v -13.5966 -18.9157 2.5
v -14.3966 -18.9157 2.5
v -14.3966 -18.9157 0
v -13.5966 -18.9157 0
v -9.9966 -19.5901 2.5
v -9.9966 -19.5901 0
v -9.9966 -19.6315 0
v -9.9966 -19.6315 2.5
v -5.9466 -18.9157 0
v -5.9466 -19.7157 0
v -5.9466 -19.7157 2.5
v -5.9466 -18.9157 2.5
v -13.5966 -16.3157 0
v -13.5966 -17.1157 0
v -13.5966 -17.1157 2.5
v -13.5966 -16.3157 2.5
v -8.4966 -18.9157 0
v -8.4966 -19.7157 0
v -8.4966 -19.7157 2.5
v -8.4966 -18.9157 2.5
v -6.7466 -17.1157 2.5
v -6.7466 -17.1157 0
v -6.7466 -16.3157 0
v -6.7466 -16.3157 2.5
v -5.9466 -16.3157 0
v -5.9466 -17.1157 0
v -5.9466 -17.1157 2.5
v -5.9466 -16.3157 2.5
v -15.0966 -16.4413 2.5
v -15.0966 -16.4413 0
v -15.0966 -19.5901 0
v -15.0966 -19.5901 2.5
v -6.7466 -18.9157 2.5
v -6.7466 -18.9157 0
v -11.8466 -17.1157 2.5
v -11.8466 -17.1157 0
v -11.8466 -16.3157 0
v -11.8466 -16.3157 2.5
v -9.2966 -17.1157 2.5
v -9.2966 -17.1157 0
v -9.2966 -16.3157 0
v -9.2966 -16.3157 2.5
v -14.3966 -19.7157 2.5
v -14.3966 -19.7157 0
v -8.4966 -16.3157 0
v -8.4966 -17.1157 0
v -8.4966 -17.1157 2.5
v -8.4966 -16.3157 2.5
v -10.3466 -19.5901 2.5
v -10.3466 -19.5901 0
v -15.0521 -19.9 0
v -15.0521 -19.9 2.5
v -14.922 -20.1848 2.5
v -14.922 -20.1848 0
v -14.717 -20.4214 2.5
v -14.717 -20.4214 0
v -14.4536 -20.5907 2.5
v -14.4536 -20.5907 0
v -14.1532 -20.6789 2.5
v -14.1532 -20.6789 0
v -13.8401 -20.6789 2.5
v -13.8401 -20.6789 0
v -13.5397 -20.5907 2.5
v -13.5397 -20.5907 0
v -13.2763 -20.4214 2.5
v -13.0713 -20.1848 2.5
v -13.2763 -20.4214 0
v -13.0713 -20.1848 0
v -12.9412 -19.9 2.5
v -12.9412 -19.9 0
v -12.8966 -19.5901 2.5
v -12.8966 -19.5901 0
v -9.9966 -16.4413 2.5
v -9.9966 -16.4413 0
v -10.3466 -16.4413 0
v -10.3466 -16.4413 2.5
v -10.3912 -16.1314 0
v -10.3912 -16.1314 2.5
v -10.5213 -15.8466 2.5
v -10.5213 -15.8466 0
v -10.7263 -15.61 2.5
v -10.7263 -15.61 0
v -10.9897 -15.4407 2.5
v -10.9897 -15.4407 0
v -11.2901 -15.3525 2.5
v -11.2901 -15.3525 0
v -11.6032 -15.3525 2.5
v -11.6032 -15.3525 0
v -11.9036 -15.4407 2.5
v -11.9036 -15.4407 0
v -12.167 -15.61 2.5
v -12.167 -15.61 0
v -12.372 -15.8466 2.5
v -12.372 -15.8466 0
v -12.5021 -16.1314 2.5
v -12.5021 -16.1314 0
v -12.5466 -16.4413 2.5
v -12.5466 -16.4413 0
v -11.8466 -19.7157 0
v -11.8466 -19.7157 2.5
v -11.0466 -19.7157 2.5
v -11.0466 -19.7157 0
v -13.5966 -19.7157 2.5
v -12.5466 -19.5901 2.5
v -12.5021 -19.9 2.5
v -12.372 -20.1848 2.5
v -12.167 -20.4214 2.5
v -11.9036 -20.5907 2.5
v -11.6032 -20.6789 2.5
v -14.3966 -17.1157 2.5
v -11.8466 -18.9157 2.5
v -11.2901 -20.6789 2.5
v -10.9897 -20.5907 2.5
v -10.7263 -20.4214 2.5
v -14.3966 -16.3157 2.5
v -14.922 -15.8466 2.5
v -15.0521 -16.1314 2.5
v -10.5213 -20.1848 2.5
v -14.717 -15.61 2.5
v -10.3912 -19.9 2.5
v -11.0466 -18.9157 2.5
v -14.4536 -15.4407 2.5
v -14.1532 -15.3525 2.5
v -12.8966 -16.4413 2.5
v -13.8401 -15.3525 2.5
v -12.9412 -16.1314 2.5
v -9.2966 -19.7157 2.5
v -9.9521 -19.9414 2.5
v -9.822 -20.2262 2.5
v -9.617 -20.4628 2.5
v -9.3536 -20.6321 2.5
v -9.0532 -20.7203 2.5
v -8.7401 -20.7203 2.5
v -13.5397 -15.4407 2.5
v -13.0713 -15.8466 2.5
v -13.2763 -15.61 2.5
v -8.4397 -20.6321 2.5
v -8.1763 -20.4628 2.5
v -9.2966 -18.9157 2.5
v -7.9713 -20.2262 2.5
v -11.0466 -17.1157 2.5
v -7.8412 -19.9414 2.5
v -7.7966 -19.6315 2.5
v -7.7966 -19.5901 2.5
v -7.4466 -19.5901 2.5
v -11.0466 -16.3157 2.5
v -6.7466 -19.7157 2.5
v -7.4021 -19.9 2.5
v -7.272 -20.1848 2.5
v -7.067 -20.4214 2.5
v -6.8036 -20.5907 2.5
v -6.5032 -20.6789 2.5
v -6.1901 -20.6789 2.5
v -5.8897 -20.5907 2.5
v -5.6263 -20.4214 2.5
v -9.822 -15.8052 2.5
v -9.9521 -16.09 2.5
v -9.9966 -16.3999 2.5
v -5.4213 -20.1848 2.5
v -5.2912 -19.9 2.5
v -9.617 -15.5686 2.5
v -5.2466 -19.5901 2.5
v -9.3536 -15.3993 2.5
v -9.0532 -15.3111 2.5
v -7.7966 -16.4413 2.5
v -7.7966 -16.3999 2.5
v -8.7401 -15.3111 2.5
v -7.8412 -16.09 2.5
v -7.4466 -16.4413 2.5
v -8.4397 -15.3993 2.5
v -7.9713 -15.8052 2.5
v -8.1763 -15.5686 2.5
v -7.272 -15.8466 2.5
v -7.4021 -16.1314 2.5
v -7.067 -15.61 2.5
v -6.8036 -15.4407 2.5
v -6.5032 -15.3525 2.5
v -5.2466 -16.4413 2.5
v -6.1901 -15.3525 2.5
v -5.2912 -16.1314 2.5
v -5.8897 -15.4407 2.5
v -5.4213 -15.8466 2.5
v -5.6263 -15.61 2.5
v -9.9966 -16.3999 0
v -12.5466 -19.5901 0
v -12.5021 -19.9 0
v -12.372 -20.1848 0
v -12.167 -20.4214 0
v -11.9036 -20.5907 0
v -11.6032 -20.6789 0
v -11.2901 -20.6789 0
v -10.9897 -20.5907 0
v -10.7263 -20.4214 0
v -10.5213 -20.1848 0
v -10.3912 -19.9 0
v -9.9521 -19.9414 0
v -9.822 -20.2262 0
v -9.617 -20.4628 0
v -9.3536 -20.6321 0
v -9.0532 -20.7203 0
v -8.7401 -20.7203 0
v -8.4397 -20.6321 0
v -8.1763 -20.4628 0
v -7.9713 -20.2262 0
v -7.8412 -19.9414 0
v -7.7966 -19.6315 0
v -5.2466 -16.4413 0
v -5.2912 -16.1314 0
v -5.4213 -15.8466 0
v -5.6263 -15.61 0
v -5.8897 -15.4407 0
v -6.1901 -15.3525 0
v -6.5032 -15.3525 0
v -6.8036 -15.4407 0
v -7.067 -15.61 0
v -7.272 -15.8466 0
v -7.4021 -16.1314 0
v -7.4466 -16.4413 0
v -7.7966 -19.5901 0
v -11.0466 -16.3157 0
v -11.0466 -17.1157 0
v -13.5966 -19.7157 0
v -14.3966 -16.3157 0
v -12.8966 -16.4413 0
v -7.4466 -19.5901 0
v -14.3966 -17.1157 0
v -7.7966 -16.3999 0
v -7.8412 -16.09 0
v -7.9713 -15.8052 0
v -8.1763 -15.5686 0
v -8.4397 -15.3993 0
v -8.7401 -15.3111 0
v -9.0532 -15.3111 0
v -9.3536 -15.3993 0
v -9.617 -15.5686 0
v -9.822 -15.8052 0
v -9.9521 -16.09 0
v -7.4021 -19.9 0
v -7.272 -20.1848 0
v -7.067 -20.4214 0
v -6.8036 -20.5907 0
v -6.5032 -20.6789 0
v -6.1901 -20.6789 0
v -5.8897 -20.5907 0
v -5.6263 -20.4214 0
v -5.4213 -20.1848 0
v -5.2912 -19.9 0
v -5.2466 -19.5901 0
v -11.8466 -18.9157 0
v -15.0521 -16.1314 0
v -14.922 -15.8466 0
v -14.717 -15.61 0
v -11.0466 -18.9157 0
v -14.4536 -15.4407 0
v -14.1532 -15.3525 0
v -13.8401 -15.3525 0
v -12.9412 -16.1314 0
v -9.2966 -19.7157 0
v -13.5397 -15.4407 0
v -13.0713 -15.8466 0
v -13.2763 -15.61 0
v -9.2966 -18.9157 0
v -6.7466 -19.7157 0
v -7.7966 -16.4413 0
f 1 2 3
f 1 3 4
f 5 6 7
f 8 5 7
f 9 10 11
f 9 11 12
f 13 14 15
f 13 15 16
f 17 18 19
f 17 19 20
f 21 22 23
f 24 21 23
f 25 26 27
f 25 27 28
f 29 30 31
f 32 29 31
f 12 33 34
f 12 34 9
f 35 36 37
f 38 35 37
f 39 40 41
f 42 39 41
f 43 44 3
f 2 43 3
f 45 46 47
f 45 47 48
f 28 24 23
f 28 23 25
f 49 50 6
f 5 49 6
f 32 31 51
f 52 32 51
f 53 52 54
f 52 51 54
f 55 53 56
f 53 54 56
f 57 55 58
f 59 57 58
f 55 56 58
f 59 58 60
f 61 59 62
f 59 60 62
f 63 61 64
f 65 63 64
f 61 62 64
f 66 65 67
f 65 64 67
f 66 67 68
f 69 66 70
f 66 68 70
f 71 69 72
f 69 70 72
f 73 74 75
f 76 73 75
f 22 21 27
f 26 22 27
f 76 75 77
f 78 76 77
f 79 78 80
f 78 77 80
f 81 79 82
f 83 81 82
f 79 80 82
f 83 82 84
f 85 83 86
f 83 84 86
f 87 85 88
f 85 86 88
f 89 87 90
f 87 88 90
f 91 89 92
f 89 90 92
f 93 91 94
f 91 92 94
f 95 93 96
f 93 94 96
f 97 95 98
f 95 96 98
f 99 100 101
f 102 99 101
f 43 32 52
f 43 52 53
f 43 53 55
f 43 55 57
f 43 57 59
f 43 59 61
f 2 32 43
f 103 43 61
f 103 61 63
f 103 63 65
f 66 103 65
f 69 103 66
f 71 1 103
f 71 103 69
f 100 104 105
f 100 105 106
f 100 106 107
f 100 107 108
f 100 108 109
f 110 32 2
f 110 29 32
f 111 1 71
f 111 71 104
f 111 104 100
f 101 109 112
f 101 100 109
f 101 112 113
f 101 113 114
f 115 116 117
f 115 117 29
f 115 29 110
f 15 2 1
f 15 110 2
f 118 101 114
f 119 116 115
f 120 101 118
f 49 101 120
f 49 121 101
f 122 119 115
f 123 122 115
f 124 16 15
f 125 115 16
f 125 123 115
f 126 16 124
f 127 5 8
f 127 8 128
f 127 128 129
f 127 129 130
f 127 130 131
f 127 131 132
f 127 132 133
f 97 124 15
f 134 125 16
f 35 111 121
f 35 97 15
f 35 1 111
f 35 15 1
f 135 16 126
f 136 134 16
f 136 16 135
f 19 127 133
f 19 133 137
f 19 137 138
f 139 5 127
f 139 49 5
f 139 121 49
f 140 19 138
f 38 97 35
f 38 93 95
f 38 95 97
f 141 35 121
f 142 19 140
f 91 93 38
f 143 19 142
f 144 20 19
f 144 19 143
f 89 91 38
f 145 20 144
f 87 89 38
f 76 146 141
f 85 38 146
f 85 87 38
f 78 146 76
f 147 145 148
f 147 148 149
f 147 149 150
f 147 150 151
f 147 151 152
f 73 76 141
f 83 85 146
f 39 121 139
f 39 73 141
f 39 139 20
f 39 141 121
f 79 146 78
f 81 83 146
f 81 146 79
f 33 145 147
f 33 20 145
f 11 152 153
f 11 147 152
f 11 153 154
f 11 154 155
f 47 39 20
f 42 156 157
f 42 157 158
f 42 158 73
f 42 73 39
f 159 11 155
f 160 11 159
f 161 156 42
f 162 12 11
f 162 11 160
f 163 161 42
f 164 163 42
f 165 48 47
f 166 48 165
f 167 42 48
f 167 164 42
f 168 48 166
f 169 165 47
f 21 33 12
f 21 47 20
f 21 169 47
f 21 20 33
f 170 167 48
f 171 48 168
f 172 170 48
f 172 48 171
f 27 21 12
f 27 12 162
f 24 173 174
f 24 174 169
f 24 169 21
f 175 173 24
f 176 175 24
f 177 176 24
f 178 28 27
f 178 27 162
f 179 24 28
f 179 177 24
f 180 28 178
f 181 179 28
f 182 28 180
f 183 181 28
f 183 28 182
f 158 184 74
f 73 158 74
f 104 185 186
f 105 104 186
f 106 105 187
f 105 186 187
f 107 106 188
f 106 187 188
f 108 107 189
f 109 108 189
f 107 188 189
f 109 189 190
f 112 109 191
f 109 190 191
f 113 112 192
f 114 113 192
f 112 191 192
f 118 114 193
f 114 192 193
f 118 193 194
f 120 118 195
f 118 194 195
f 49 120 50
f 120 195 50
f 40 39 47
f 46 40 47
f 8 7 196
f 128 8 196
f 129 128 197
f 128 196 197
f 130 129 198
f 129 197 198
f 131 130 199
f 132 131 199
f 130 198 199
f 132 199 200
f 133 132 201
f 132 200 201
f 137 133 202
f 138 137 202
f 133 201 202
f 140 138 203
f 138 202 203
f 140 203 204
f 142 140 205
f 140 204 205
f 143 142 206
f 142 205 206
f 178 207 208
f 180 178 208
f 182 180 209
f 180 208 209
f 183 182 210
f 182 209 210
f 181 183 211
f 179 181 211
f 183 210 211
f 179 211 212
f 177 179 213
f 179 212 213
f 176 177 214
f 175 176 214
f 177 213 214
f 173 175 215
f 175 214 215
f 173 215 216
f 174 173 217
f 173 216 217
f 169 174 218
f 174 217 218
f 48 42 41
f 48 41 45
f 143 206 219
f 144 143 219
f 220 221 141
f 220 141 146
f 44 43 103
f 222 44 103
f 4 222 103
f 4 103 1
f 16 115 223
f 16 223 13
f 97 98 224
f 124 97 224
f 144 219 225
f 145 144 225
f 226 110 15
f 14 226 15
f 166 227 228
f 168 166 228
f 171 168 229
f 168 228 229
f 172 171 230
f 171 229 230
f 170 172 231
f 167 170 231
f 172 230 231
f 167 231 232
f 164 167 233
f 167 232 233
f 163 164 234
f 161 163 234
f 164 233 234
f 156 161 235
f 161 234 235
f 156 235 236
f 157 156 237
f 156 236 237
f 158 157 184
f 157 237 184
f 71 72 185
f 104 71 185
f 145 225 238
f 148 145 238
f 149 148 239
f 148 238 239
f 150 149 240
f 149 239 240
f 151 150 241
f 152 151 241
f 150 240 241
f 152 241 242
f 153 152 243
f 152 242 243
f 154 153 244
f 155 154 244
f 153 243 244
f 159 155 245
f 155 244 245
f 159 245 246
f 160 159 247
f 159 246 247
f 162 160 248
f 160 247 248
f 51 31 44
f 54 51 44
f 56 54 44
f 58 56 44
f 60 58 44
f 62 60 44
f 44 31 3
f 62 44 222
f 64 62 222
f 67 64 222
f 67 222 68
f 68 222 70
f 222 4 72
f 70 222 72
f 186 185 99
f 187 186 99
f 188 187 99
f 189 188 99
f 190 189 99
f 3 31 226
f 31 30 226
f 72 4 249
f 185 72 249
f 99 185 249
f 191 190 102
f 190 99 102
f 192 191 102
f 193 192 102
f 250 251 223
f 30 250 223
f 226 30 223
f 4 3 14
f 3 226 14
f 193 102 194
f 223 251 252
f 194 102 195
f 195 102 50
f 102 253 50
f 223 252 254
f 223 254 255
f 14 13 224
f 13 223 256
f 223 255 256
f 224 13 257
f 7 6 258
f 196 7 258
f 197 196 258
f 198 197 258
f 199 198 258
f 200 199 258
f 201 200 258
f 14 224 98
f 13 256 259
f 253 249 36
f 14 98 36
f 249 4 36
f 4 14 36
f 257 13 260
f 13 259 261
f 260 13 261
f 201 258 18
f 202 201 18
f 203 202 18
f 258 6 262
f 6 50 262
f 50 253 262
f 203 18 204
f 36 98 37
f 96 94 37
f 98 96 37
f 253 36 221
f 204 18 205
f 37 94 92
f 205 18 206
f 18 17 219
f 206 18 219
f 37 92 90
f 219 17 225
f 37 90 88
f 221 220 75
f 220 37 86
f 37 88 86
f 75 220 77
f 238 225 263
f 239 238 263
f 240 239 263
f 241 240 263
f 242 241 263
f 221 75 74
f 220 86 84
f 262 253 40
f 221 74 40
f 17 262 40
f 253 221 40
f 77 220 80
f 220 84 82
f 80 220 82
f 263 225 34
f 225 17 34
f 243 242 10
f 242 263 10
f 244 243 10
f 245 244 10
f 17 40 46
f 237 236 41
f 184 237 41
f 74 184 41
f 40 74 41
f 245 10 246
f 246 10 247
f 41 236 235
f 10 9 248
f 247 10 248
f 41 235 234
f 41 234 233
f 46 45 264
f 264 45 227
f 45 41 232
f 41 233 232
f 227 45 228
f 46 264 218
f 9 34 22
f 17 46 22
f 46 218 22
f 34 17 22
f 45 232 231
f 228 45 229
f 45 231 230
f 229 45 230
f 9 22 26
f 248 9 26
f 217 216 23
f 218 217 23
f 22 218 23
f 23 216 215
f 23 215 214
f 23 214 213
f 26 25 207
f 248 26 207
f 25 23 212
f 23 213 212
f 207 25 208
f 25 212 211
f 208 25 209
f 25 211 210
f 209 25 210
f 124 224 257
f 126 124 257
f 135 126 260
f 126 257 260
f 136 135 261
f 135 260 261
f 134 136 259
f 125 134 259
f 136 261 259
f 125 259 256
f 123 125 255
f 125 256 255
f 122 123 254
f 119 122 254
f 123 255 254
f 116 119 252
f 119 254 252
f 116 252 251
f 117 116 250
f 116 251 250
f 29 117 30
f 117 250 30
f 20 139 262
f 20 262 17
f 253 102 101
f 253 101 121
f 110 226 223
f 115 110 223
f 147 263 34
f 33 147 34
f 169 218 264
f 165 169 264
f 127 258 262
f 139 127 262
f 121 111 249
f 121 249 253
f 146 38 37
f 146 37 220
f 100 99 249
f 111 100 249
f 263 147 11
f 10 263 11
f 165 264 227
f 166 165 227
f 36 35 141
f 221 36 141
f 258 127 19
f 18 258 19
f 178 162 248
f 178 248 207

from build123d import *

# Parameters (mm, degrees)
P_IDAT_VYSUNUT_M2_DEPTH  = 2.5
SKICA3_W                 = 0.8
SKICA3_H                 = 0.8
ODEBRAT_VYSUNUT_M1_DEPTH = 2.5
SKICA4_W                 = 8.539651134
SKICA4_H                 = 7.495504433
ODEBRAT_VYSUNUT_M2_DEPTH = 2.5


# Read off the part's stored shape, not the designer's step: Přidat vysunutím2
with BuildPart() as part:
    # Přidat vysunutím2 outline → Přidat vysunutím2 (new body)
    with BuildSketch(Plane.XY):
        with BuildLine():
            Line((2.40336004, -19.590083306), (2.40336004, -16.441317707))
            ThreePointArc((2.40336004, -16.441317707), (1.30336004, -15.341317707), (0.20336004, -16.441317707))
            Line((0.20336004, -16.441317707), (-0.14663996, -16.441317707))
            ThreePointArc((-0.14663996, -16.441317707), (-1.24602276, -15.34131788), (-2.346639267, -16.440083307))
            Line((-2.346639267, -16.440083307), (-2.696640653, -16.440083307))
            ThreePointArc((-2.696640653, -16.440083307), (-3.79725716, -15.34131788), (-4.89663996, -16.441317707))
            Line((-4.89663996, -16.441317707), (-5.24663996, -16.441317707))
            ThreePointArc((-5.24663996, -16.441317707), (-6.34663996, -15.341317707), (-7.44663996, -16.441317707))
            Line((-7.44663996, -16.441317707), (-7.79663996, -16.441317707))
            Line((-7.79663996, -16.441317707), (-7.79663996, -16.399925636))
            ThreePointArc((-7.79663996, -16.399925636), (-8.89663996, -15.299925636), (-9.99663996, -16.399925636))
            Line((-9.99663996, -16.399925636), (-9.99663996, -16.441317707))
            Line((-9.99663996, -16.441317707), (-10.34663996, -16.441317707))
            ThreePointArc((-10.34663996, -16.441317707), (-11.44663996, -15.341317707), (-12.54663996, -16.441317707))
            Line((-12.54663996, -16.441317707), (-12.89663996, -16.441317707))
            ThreePointArc((-12.89663996, -16.441317707), (-13.99663996, -15.341317707), (-15.09663996, -16.441317707))
            Line((-15.09663996, -16.441317707), (-15.09663996, -19.590083306))
            ThreePointArc((-15.09663996, -19.590083306), (-13.99663996, -20.690083306), (-12.89663996, -19.590083306))
            Line((-12.89663996, -19.590083306), (-12.54663996, -19.590083306))
            ThreePointArc((-12.54663996, -19.590083306), (-11.44663996, -20.690083306), (-10.34663996, -19.590083306))
            Line((-10.34663996, -19.590083306), (-9.99663996, -19.590083306))
            Line((-9.99663996, -19.590083306), (-9.99663996, -19.631475378))
            ThreePointArc((-9.99663996, -19.631475378), (-8.89663996, -20.731475378), (-7.79663996, -19.631475378))
            Line((-7.79663996, -19.631475378), (-7.79663996, -19.590083306))
            Line((-7.79663996, -19.590083306), (-7.44663996, -19.590083306))
            ThreePointArc((-7.44663996, -19.590083306), (-6.34663996, -20.690083306), (-5.24663996, -19.590083306))
            Line((-5.24663996, -19.590083306), (-4.89663996, -19.590083306))
            ThreePointArc((-4.89663996, -19.590083306), (-3.79663996, -20.690083306), (-2.69663996, -19.590083306))
            Line((-2.69663996, -19.590083306), (-2.34663996, -19.590083306))
            ThreePointArc((-2.34663996, -19.590083306), (-1.24663996, -20.690083306), (-0.14663996, -19.590083306))
            Line((-0.14663996, -19.590083306), (0.20336004, -19.590083306))
            ThreePointArc((0.20336004, -19.590083306), (1.30336004, -20.690083306), (2.40336004, -19.590083306))
        make_face()
    extrude(amount=P_IDAT_VYSUNUT_M2_DEPTH)

    # Skica3 → Odebrat vysunutím1 (cut)
    with BuildSketch(Plane.XY.offset(2.5)):
        with Locations((-13.99663996, -16.715700507)):
            Rectangle(SKICA3_W, SKICA3_H)
        with Locations((-13.99663996, -19.315700507)):
            Rectangle(SKICA3_W, SKICA3_H)
        with Locations((-8.89663996, -16.715700507)):
            Rectangle(SKICA3_W, SKICA3_H)
        with Locations((-11.44663996, -16.715700507)):
            Rectangle(SKICA3_W, SKICA3_H)
        with Locations((-11.44663996, -19.315700507)):
            Rectangle(SKICA3_W, SKICA3_H)
        with Locations((-8.89663996, -19.315700507)):
            Rectangle(SKICA3_W, SKICA3_H)
        with Locations((-6.34663996, -16.715700507)):
            Rectangle(SKICA3_W, SKICA3_H)
        with Locations((-6.34663996, -19.315700507)):
            Rectangle(SKICA3_W, SKICA3_H)
        with Locations((-3.79663996, -16.715700507)):
            Rectangle(SKICA3_W, SKICA3_H)
        with Locations((-3.79663996, -19.315700507)):
            Rectangle(SKICA3_W, SKICA3_H)
        with Locations((-1.24663996, -16.715700507)):
            Rectangle(SKICA3_W, SKICA3_H)
        with Locations((-1.24663996, -19.315700507)):
            Rectangle(SKICA3_W, SKICA3_H)
        with Locations((1.30336004, -16.715700507)):
            Rectangle(SKICA3_W, SKICA3_H)
        with Locations((1.30336004, -19.315700507)):
            Rectangle(SKICA3_W, SKICA3_H)
    extrude(amount=-ODEBRAT_VYSUNUT_M1_DEPTH, mode=Mode.SUBTRACT)

    # Skica4 → Odebrat vysunutím2 (cut)
    with BuildSketch(Plane.XY.offset(2.5)):
        with Locations((-0.976814393, -18.745431106)):
            Rectangle(SKICA4_W, SKICA4_H)
    extrude(amount=-ODEBRAT_VYSUNUT_M2_DEPTH, mode=Mode.SUBTRACT)


solid = part.part
